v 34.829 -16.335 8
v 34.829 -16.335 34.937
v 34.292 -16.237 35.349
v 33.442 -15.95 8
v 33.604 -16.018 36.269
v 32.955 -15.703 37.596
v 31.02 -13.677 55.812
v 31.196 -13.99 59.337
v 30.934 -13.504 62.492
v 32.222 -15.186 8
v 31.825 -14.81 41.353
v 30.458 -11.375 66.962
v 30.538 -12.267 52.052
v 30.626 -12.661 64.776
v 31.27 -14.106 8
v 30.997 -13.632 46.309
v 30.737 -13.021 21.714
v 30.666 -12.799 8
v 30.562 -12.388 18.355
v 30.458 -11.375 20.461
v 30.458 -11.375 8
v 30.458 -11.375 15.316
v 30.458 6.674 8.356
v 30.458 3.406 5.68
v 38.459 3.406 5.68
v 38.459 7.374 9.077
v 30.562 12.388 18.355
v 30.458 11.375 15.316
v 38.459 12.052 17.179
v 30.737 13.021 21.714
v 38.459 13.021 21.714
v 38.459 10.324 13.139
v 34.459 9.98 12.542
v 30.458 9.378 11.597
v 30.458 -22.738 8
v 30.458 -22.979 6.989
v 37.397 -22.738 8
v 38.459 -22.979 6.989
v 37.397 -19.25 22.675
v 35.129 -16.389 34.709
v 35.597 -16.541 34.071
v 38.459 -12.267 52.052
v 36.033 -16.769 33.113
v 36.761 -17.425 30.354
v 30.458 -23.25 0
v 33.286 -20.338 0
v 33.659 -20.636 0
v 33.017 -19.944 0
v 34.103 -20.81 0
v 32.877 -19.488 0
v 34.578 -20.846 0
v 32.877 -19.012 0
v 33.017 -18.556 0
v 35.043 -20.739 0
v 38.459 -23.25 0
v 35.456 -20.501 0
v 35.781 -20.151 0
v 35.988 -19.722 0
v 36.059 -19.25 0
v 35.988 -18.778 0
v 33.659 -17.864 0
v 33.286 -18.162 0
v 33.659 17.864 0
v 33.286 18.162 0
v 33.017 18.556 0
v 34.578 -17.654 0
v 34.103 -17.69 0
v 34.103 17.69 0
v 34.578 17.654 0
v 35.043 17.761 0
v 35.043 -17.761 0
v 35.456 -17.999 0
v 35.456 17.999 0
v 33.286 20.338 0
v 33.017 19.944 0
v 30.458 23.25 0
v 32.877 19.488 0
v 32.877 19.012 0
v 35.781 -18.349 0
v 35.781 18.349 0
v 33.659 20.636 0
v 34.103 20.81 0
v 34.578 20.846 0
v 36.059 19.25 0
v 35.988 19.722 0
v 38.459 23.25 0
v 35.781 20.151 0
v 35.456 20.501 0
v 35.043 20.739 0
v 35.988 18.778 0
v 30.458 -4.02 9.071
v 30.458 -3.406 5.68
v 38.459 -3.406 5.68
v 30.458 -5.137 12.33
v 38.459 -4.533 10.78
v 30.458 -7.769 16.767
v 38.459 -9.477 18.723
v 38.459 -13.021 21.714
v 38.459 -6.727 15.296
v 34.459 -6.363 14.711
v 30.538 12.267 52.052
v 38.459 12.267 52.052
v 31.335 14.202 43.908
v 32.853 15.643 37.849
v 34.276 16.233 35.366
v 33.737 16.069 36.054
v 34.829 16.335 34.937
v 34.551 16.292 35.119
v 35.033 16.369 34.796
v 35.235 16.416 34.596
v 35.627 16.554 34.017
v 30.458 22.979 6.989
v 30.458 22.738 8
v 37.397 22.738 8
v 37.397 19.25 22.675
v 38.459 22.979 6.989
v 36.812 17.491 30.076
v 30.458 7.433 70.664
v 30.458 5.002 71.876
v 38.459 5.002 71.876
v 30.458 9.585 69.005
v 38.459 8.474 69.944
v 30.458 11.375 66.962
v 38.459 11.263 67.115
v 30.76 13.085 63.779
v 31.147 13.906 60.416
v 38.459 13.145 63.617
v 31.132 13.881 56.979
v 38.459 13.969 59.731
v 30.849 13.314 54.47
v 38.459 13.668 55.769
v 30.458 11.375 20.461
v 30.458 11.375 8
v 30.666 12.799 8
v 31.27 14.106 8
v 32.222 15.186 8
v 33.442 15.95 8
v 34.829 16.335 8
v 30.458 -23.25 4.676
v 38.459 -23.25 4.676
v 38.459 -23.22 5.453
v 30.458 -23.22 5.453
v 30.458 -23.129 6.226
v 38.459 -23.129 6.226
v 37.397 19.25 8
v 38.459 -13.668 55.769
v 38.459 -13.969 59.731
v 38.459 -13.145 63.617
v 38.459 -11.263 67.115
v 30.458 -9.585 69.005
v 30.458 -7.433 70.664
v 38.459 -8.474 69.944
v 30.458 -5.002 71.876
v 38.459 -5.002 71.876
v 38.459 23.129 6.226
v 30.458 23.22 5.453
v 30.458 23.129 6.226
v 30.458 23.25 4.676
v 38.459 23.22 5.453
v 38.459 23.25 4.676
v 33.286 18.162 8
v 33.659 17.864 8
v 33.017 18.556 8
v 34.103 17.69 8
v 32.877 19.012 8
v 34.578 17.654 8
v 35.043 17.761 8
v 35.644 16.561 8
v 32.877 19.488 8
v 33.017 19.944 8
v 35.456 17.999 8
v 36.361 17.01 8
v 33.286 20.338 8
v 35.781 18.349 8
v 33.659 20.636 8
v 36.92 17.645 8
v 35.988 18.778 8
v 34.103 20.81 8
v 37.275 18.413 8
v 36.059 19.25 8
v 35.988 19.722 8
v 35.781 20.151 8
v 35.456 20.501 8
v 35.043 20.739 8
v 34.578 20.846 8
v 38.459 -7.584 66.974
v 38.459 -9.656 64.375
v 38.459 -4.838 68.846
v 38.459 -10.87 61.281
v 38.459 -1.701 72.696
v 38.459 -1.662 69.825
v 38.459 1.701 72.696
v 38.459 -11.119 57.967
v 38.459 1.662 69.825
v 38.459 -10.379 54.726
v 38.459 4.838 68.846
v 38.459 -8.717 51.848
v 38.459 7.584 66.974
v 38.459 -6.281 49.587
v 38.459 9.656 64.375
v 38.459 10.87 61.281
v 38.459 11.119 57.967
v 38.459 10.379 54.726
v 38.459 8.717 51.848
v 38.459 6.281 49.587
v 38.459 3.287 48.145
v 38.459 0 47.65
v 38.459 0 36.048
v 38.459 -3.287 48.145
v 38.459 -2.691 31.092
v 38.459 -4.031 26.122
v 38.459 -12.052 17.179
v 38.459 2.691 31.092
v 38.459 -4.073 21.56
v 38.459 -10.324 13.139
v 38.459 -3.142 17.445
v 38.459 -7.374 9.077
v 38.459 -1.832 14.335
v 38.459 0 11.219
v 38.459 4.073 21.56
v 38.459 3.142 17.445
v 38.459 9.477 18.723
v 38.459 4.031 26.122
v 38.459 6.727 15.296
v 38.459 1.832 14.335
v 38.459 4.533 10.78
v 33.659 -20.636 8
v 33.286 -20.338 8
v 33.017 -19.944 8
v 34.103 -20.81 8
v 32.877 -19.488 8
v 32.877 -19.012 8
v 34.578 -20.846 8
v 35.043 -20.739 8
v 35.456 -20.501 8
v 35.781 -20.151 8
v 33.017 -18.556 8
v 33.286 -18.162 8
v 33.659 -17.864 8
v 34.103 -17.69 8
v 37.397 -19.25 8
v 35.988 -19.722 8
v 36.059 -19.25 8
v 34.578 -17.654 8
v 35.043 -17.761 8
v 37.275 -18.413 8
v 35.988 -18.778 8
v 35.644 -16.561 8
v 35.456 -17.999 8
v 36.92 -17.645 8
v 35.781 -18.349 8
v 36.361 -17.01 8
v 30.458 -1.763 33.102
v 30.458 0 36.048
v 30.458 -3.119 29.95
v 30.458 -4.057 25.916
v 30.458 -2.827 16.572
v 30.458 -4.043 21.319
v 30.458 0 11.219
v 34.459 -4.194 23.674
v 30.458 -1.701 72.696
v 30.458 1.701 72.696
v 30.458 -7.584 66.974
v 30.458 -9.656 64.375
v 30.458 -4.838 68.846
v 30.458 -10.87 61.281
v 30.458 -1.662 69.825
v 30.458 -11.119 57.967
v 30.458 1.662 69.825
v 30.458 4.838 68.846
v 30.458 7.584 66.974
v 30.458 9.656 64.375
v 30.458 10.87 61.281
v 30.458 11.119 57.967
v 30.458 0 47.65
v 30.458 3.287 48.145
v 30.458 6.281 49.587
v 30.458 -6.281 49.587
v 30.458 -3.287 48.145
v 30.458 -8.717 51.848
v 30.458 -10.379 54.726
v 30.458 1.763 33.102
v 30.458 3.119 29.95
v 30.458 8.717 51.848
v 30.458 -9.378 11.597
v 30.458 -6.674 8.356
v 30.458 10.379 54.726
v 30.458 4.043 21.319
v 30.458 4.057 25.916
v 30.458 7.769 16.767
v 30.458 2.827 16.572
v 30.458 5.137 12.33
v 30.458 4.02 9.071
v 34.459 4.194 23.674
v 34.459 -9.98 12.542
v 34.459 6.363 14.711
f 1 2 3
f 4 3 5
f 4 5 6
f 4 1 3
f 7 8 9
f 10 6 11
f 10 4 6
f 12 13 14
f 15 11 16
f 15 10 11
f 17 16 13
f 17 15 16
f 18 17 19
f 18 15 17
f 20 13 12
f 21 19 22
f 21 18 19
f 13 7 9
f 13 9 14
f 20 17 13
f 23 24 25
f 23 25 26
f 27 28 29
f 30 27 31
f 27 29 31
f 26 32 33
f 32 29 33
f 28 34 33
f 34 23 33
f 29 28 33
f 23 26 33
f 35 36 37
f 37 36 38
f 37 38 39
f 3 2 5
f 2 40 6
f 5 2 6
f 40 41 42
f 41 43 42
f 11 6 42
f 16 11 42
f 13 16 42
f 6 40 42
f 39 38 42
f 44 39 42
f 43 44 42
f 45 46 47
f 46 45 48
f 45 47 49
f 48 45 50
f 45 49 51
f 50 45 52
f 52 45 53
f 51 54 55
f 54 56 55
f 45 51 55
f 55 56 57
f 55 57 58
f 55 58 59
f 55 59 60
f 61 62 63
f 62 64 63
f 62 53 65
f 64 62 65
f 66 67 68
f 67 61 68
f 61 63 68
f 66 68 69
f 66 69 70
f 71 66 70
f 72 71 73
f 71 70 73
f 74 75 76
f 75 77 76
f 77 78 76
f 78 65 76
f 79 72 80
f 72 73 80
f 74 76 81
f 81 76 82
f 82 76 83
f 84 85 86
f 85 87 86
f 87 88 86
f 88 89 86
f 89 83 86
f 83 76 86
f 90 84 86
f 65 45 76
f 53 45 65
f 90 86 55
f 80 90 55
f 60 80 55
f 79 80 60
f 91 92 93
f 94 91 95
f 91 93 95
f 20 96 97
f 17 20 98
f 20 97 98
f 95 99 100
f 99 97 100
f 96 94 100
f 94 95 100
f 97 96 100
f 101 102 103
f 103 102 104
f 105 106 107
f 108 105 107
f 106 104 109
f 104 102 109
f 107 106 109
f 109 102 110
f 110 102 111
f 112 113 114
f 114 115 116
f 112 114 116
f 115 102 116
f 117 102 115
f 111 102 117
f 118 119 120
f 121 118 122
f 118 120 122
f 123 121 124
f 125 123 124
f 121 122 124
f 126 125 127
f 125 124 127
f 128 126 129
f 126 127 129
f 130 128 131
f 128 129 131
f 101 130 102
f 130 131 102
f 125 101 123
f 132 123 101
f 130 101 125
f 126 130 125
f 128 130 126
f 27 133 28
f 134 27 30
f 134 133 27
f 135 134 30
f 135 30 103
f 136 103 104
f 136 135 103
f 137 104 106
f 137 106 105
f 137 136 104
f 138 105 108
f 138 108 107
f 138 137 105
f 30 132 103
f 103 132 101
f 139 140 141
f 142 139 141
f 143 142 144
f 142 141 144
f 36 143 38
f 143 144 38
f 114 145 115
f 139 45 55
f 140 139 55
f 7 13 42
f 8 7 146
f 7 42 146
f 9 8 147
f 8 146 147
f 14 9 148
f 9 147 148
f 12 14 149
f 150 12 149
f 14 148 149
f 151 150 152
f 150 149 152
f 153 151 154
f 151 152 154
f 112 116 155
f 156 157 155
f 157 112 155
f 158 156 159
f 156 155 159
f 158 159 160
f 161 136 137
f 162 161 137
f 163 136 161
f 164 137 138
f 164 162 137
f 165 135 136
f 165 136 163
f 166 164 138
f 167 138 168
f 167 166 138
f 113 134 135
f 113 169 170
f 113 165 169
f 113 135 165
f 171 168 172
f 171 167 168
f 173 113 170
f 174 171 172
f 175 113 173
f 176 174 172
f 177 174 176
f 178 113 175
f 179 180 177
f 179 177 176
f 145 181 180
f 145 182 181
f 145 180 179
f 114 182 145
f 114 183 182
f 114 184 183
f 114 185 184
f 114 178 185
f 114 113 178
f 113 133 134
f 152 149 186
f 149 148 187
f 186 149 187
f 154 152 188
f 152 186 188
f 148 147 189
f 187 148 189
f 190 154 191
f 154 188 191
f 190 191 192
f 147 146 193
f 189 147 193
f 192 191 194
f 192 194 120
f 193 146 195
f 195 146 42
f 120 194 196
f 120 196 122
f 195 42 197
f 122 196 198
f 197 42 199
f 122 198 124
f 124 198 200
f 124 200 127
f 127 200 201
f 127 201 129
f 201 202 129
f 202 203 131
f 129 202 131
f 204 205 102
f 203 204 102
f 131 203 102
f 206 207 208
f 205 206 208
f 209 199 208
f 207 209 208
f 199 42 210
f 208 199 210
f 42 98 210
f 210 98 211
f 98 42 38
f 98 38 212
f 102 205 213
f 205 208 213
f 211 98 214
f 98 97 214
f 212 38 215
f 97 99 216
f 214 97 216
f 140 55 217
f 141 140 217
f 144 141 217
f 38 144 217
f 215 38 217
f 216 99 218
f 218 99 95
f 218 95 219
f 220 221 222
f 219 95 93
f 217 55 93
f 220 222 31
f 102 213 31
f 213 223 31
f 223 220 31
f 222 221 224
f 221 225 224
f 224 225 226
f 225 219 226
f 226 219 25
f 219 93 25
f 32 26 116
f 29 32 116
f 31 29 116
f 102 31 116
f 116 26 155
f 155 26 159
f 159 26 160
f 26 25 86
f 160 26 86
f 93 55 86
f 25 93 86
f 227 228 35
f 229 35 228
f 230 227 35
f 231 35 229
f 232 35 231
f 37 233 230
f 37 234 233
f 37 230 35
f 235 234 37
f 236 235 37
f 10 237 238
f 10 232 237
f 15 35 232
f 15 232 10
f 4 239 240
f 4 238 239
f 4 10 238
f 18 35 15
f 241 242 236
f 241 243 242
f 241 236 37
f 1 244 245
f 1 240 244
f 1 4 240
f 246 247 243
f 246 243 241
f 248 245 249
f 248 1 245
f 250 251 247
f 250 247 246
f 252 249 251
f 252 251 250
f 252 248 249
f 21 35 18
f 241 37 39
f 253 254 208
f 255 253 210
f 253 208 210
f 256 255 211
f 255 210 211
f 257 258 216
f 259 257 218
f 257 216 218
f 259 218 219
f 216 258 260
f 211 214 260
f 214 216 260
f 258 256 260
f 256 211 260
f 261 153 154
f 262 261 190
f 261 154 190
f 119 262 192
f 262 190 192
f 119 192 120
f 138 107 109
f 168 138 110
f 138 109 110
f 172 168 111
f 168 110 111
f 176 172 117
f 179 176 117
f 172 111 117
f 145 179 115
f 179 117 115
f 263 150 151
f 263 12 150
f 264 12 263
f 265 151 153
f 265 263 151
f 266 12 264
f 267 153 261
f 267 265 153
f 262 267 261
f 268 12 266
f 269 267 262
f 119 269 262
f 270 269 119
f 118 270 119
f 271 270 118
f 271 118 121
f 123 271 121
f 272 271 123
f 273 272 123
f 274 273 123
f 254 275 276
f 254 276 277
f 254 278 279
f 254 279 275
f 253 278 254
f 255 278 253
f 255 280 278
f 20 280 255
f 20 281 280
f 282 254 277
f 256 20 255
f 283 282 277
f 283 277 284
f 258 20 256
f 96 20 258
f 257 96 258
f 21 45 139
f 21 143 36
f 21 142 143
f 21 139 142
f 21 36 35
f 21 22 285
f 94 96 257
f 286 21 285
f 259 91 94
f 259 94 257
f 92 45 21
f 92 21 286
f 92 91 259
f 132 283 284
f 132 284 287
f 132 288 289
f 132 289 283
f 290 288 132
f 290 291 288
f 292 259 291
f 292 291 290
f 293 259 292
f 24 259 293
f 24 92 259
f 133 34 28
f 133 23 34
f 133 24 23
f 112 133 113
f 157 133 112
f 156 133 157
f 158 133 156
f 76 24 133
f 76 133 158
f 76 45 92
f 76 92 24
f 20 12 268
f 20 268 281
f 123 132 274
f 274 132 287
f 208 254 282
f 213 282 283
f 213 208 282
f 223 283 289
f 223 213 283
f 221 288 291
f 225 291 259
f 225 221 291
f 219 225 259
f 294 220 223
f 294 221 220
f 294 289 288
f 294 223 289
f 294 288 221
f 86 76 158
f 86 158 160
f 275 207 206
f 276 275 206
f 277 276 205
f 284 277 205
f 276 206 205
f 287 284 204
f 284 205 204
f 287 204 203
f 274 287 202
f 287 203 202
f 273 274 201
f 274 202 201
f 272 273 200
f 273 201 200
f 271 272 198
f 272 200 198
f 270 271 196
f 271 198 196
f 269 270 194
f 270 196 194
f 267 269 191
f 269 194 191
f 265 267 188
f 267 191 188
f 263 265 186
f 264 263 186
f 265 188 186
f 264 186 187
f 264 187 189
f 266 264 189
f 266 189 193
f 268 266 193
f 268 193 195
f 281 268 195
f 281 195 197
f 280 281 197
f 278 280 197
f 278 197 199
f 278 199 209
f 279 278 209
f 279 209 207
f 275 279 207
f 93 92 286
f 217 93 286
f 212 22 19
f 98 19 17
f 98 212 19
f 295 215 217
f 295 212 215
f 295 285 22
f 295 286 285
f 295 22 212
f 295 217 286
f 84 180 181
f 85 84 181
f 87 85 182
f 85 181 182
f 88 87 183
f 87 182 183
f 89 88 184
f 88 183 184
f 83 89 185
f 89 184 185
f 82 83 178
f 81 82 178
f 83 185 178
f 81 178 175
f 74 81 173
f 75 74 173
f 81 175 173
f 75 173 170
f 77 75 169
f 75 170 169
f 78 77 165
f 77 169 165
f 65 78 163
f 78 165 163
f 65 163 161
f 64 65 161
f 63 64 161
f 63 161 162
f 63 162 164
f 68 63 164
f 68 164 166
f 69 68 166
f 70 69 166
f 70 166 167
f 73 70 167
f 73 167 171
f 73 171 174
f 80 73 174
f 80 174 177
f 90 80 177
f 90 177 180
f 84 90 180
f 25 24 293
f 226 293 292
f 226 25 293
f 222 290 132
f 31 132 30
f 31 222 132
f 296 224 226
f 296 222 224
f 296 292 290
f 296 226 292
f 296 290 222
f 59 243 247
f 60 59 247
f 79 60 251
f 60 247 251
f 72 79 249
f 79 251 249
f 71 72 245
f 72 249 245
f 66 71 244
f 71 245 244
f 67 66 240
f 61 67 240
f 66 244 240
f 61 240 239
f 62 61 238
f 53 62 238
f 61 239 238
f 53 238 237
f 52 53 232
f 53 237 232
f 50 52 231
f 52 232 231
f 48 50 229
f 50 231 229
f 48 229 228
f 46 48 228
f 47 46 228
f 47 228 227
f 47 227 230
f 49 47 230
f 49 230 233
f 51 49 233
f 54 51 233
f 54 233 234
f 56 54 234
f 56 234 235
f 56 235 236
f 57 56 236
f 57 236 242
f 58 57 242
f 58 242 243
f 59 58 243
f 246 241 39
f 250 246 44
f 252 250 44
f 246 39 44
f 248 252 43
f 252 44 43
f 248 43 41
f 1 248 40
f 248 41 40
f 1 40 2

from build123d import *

# Parameters (mm, degrees)
SKETCH1_W           = 8.000974829
SKETCH1_H           = 46.5
BOSS_EXTRUDE1_DEPTH = 73
SKETCH2_R           = 11.15
CUT_EXTRUDE1_DEPTH  = 70
CUT_EXTRUDE3_DEPTH  = 62
SKETCH5_R           = 1.6
CUT_EXTRUDE4_DEPTH  = 62
FILLET2_START       = 8
FILLET2_DEPTH       = 60


with BuildPart() as part:
    # Sketch1 → Boss-Extrude1 (new body)
    with BuildSketch(Plane.XY):
        with Locations((34.458782271, 0)):
            Rectangle(SKETCH1_W, SKETCH1_H)
    extrude(amount=BOSS_EXTRUDE1_DEPTH)

    # Sketch2 → Cut-Extrude1 (cut)
    with BuildSketch(Plane(origin=(38.459269685, 0, 0), x_dir=(0, 0, -1), z_dir=(1, 0, 0))):
        with Locations((-58.8, 0)):
            Circle(SKETCH2_R)
        with BuildLine():
            Line((-73, -23.25), (-4.675968949, -23.25))
            ThreePointArc((-4.675968949, -23.25), (-5.84025075, -23.181991134), (-6.988696254, -22.978889578))
            Line((-6.988696254, -22.978889578), (-52.052198848, -12.266506414))
            ThreePointArc((-52.052198848, -12.266506414), (-63.616991815, -13.14521167), (-71.875840062, -5.002240165))
            Line((-71.875840062, -5.002240165), (-73, -8))
            Line((-73, -8), (-73, -23.25))
        make_face()
        with BuildLine():
            Line((-73, 23.25), (-73, 8))
            Line((-73, 8), (-71.875840062, 5.002240165))
            ThreePointArc((-71.875840062, 5.002240165), (-63.616991815, 13.14521167), (-52.052198848, 12.266506414))
            Line((-52.052198848, 12.266506414), (-6.988696254, 22.978889578))
            ThreePointArc((-6.988696254, 22.978889578), (-5.84025075, 23.181991134), (-4.675968949, 23.25))
            Line((-4.675968949, 23.25), (-73, 23.25))
        make_face()
        with BuildLine():
            Line((-73, 8), (-73, -8))
            Line((-73, -8), (-71.875840062, -5.002240165))
            ThreePointArc((-71.875840062, -5.002240165), (-72.8, 0), (-71.875840062, 5.002240165))
            Line((-71.875840062, 5.002240165), (-73, 8))
        make_face()
        with BuildLine():
            add(Edge.make_bspline(
                [(-5.680368735, -3.40627966), (-11.386784663, -11.746039667), (-21.714178832, -13.021085274)],
                knots=[0, 0, 0, 1, 1, 1], degree=2))
            add(Edge.make_bspline(
                [(-5.680368735, -3.40627966), (-15.724909711, -4.511710031), (-21.714178832, -13.021085274)],
                knots=[0, 0, 0, 1, 1, 1], degree=2))
        make_face()
        with BuildLine():
            add(Edge.make_bspline(
                [(-36.048150351, 0), (-23.713645553, 8.388071288), (-11.218940507, 0)],
                knots=[0, 0, 0, 1, 1, 1], degree=2))
            add(Edge.make_bspline(
                [(-36.048150351, 0), (-23.713645553, -8.388071288), (-11.218940507, 0)],
                knots=[0, 0, 0, 1, 1, 1], degree=2))
        make_face()
        with BuildLine():
            add(Edge.make_bspline(
                [(-5.680368735, 3.40627966), (-15.724909711, 4.511710031), (-21.714178832, 13.021085274)],
                knots=[0, 0, 0, 1, 1, 1], degree=2))
            add(Edge.make_bspline(
                [(-5.680368735, 3.40627966), (-11.386784663, 11.746039667), (-21.714178832, 13.021085274)],
                knots=[0, 0, 0, 1, 1, 1], degree=2))
        make_face()
    extrude(amount=-CUT_EXTRUDE1_DEPTH, mode=Mode.SUBTRACT)

    # Sketch4 → Cut-Extrude3 (cut)
    with BuildSketch(Plane.XY.offset(70)):
        with BuildLine():
            ThreePointArc((37.397007822, -19.25), (36.536421482, -17.172360788), (34.458782271, -16.311774449))
            Line((34.458782271, -16.311774449), (30.458294856, -16.311774449))
            Line((30.458294856, -16.311774449), (30.458294856, -22.188225551))
            Line((30.458294856, -22.188225551), (30.458294856, -24.738187672))
            Line((30.458294856, -24.738187672), (37.397007822, -23.25))
            Line((37.397007822, -23.25), (37.397007822, -19.25))
        make_face()
        with BuildLine():
            Line((30.458294856, 24.500594278), (30.458294856, 22.188225551))
            Line((30.458294856, 22.188225551), (30.458294856, 16.311774449))
            Line((30.458294856, 16.311774449), (34.458782271, 16.311774449))
            ThreePointArc((34.458782271, 16.311774449), (36.536421482, 17.172360788), (37.397007822, 19.25))
            Line((37.397007822, 19.25), (37.397007822, 23.25))
            Line((37.397007822, 23.25), (30.458294856, 24.500594278))
        make_face()
    extrude(amount=-CUT_EXTRUDE3_DEPTH, mode=Mode.SUBTRACT)

    # Sketch5 → Cut-Extrude4 (cut)
    with BuildSketch(Plane.XY.offset(8)):
        with Locations((34.458782271, 19.25)):
            Circle(SKETCH5_R)
        with Locations((34.458782271, -19.25)):
            Circle(SKETCH5_R)
    extrude(amount=-CUT_EXTRUDE4_DEPTH, mode=Mode.SUBTRACT)

    # Fillet2: read off the stored shape, not the designer's step
    # Fillet2 outline → Fillet2 (cut)
    with BuildSketch(Plane.XY.offset(FILLET2_START)):
        with BuildLine():
            ThreePointArc((34.828738175, -16.33515832), (31.706776269, -14.680417252), (30.458294856, -11.374950824))
            Line((30.458294856, -11.374950824), (30.458294856, -16.311774449))
            Line((30.458294856, -16.311774449), (34.458782271, -16.311774449))
            ThreePointArc((34.458782271, -16.311774449), (34.644129362, -16.317626244), (34.828738175, -16.33515832))
        make_face()
        with BuildLine():
            Line((30.458294856, 16.311774449), (30.458294856, 11.374950826))
            ThreePointArc((30.458294856, 11.374950826), (31.70677627, 14.680417253), (34.828738175, 16.33515832))
            ThreePointArc((34.828738175, 16.33515832), (34.644129362, 16.317626244), (34.458782271, 16.311774449))
            Line((34.458782271, 16.311774449), (30.458294856, 16.311774449))
        make_face()
    extrude(amount=FILLET2_DEPTH, mode=Mode.SUBTRACT)


solid = part.part
